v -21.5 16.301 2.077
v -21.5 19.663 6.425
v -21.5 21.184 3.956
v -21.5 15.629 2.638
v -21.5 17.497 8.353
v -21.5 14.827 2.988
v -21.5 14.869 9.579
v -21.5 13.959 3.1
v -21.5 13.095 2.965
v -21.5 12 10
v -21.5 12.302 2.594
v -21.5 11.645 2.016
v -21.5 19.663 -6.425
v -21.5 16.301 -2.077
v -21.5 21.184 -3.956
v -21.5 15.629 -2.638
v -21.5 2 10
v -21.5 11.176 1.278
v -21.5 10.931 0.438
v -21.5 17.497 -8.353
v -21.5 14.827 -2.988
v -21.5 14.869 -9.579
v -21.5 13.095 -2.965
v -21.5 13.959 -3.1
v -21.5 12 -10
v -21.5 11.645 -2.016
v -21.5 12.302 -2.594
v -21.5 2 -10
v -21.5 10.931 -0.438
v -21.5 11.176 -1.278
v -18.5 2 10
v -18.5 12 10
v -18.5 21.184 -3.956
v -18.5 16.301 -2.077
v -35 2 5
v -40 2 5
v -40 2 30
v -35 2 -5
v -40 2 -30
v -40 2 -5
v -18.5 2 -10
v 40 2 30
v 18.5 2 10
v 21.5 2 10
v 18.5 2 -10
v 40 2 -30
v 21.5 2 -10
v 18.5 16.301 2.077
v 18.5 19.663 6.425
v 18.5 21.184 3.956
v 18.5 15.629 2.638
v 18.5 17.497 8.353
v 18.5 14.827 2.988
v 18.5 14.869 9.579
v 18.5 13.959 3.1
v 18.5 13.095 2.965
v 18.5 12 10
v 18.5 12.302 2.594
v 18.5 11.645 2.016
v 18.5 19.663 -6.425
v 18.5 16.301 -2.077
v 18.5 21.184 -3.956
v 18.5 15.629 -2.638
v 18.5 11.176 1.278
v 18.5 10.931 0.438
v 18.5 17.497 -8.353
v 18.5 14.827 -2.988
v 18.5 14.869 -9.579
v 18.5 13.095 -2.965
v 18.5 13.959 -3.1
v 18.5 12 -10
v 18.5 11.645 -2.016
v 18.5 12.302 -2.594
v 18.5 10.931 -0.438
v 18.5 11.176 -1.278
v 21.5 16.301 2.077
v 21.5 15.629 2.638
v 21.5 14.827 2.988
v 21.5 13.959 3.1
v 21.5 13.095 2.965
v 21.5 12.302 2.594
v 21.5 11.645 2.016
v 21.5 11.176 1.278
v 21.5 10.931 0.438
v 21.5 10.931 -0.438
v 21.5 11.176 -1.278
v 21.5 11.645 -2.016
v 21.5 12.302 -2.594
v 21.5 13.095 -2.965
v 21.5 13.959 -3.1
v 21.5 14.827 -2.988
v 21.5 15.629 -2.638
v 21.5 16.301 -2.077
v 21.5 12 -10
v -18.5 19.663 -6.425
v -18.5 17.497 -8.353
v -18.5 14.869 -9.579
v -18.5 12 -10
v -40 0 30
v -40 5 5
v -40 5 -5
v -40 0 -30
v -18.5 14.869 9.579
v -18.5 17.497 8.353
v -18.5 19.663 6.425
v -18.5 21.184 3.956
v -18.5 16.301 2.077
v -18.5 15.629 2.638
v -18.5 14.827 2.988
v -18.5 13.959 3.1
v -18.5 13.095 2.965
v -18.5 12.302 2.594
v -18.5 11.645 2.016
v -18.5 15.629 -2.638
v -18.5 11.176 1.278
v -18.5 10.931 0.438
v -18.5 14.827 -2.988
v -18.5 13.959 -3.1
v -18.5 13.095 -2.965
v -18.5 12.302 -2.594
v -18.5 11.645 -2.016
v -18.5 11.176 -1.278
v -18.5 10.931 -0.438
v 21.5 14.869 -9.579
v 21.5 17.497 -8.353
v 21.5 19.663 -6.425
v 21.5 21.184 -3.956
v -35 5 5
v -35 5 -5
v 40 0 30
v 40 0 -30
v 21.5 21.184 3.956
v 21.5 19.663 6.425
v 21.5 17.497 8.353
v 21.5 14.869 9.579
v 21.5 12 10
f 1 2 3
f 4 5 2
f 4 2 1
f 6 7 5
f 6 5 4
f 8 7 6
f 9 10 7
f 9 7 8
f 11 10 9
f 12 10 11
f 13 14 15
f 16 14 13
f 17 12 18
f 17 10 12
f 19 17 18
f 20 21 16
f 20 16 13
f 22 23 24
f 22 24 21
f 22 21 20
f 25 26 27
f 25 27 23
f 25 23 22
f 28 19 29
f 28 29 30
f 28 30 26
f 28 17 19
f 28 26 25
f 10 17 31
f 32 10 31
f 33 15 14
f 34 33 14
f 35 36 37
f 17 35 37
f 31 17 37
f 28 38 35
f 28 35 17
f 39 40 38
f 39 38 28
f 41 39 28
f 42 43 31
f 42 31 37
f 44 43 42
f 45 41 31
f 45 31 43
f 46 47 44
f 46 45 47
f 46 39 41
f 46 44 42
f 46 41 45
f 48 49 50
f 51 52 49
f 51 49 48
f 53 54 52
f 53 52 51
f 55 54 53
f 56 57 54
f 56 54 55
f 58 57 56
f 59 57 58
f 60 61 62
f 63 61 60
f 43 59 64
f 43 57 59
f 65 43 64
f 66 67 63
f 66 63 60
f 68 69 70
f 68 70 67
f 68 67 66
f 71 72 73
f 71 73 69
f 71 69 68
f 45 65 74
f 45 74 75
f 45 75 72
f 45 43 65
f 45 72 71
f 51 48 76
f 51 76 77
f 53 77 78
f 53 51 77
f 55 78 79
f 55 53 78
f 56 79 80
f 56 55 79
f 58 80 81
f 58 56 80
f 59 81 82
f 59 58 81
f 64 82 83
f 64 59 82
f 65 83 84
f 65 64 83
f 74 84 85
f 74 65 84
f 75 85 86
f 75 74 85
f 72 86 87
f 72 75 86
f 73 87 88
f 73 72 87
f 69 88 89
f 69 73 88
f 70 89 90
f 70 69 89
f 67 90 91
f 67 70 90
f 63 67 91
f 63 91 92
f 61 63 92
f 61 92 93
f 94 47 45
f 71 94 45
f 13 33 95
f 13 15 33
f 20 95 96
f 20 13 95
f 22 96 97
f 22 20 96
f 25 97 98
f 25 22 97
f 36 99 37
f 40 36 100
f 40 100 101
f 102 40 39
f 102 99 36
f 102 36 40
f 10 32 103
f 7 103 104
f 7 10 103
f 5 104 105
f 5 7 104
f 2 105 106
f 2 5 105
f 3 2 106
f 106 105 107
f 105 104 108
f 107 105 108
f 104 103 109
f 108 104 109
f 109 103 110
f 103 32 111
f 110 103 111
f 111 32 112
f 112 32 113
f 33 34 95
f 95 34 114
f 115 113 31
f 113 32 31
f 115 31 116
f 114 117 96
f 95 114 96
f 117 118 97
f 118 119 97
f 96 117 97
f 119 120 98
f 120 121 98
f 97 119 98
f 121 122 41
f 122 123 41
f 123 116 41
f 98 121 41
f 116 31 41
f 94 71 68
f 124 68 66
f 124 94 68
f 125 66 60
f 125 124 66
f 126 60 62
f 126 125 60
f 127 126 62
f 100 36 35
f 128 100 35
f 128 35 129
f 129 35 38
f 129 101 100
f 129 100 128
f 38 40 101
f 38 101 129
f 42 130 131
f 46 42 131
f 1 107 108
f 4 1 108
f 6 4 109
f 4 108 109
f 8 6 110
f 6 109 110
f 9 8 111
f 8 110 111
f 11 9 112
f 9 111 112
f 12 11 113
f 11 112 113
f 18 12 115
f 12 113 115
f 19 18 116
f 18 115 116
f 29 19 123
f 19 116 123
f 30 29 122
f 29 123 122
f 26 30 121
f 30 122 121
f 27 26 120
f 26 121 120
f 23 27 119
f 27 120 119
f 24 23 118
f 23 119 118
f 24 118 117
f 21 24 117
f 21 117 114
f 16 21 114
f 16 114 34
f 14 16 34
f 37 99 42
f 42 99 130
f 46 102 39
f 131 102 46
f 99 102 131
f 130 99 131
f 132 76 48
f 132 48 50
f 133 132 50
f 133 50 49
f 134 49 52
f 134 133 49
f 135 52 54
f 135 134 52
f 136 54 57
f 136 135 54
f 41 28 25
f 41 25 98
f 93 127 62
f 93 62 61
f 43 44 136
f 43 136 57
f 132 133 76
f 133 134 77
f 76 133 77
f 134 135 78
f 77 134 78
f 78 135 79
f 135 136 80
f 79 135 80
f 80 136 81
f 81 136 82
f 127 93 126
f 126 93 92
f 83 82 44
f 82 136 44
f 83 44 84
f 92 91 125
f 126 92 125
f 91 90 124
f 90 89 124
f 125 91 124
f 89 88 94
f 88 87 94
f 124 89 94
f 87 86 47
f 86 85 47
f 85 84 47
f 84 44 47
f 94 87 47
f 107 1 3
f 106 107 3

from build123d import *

# Parameters (mm, degrees)
SKETCH1_W                   = 80
SKETCH1_H                   = 60
BOSS_EXTRUDE1_DEPTH         = 2
SKETCH2_W                   = 3
SKETCH2_H                   = 20
BOSS_EXTRUDE2_DEPTH         = 20
CUT_EXTRUDE1_REACH          = 71.327
SKETCH3_R                   = 3.1
FILLET1_RADIUS              = 10
FILLET1_LENGTH              = 3
CUT_EXTRUDE2_REACH          = 73.877
FILLET1_OF_MIRROR1_2_RADIUS = 10
FILLET1_OF_MIRROR1_2_LENGTH = 3
SKETCH5_W                   = 5
SKETCH5_H                   = 10
BOSS_EXTRUDE3_DEPTH         = 3


with BuildPart() as part:
    # Sketch1 → Boss-Extrude1 (new body)
    with BuildSketch(Plane(origin=(0, 0, 0), x_dir=(1, 0, 0), z_dir=(0, 1, 0))):
        Rectangle(SKETCH1_W, SKETCH1_H)
    extrude(amount=BOSS_EXTRUDE1_DEPTH)

    # Sketch2 → Boss-Extrude2 (add)
    with BuildSketch(Plane(origin=(0, 2, 0), x_dir=(1, 0, 0), z_dir=(0, 1, 0))):
        with Locations((-20, 0)):
            Rectangle(SKETCH2_W, SKETCH2_H)
    boss_extrude2 = extrude(amount=BOSS_EXTRUDE2_DEPTH)

    # Sketch3 → Cut-Extrude1 (cut, up to next)
    with BuildSketch(Plane(origin=(-18.5, 0, 0), x_dir=(0, 0, -1), z_dir=(1, 0, 0)), mode=Mode.PRIVATE) as cut_extrude1_sk1:
        with Locations((0, 14)):
            Circle(SKETCH3_R)
    cut_extrude1_tool1 = extrude(cut_extrude1_sk1.sketch, amount=-CUT_EXTRUDE1_REACH, mode=Mode.PRIVATE) & part.part
    cut_extrude1 = cut_extrude1_tool1.solids().sort_by_distance((-18.5, 14, 0))[0]
    add(cut_extrude1, mode=Mode.SUBTRACT)

    # Fillet1: full round fillet: the end face becomes a half cylinder, R = half its width
    fillet1_face = Plane((-20, 22, 0), x_dir=(-1, 0, 0), z_dir=(0, 1, 0))  # on the end face: x along it, z out of the body
    fillet1_slab = fillet1_face.offset(-FILLET1_RADIUS / 2) * Box(FILLET1_LENGTH, 2 * FILLET1_RADIUS, FILLET1_RADIUS, mode=Mode.PRIVATE)  # the body's end, R deep
    fillet1_round = Plane((-20, 12, 0), x_dir=(0, 1, 0), z_dir=(-1, 0, 0)) * Cylinder(FILLET1_RADIUS, FILLET1_LENGTH, mode=Mode.PRIVATE)  # its axis R under the face
    add(fillet1_slab - fillet1_round, mode=Mode.SUBTRACT)

    # Sketch4 → Cut-Extrude2 (cut, up to next)
    with BuildSketch(Plane.ZY.offset(21.5), mode=Mode.PRIVATE) as cut_extrude2_sk1:
        Polygon((0, 10.9), (5, 23.9), (-5, 23.9), align=None)
    cut_extrude2_tool1 = extrude(cut_extrude2_sk1.sketch, amount=-CUT_EXTRUDE2_REACH, mode=Mode.PRIVATE) & part.part
    cut_extrude2 = cut_extrude2_tool1.solids().sort_by_distance((-21.5, 19.566667, 0))[0]
    add(cut_extrude2, mode=Mode.SUBTRACT)

    # Mirror1: Boss-Extrude2, Cut-Extrude1, Cut-Extrude2 across plane
    add(boss_extrude2.mirror(Plane(origin=(0, 0, 0), x_dir=(0, 0, 1), z_dir=(1, 0, 0))))
    add(cut_extrude1.mirror(Plane(origin=(0, 0, 0), x_dir=(0, 0, 1), z_dir=(1, 0, 0))), mode=Mode.SUBTRACT)
    add(cut_extrude2.mirror(Plane(origin=(0, 0, 0), x_dir=(0, 0, 1), z_dir=(1, 0, 0))), mode=Mode.SUBTRACT)

    # Fillet1 of Mirror1 2: full round fillet: the end face becomes a half cylinder, R = half its width
    fillet1_of_mirror1_2_face = Plane((20, 22, 0), x_dir=(1, 0, 0), z_dir=(0, 1, 0))  # on the end face: x along it, z out of the body
    fillet1_of_mirror1_2_slab = fillet1_of_mirror1_2_face.offset(-FILLET1_OF_MIRROR1_2_RADIUS / 2) * Box(FILLET1_OF_MIRROR1_2_LENGTH, 2 * FILLET1_OF_MIRROR1_2_RADIUS, FILLET1_OF_MIRROR1_2_RADIUS, mode=Mode.PRIVATE)  # the body's end, R deep
    fillet1_of_mirror1_2_round = Plane((20, 12, 0), x_dir=(0, 1, 0), z_dir=(1, 0, 0)) * Cylinder(FILLET1_OF_MIRROR1_2_RADIUS, FILLET1_OF_MIRROR1_2_LENGTH, mode=Mode.PRIVATE)  # its axis R under the face
    add(fillet1_of_mirror1_2_slab - fillet1_of_mirror1_2_round, mode=Mode.SUBTRACT)

    # Sketch5 → Boss-Extrude3 (add)
    with BuildSketch(Plane(origin=(0, 2, 0), x_dir=(1, 0, 0), z_dir=(0, 1, 0))):
        with Locations((-37.5, 0)):
            Rectangle(SKETCH5_W, SKETCH5_H)
    extrude(amount=BOSS_EXTRUDE3_DEPTH)


solid = part.part
